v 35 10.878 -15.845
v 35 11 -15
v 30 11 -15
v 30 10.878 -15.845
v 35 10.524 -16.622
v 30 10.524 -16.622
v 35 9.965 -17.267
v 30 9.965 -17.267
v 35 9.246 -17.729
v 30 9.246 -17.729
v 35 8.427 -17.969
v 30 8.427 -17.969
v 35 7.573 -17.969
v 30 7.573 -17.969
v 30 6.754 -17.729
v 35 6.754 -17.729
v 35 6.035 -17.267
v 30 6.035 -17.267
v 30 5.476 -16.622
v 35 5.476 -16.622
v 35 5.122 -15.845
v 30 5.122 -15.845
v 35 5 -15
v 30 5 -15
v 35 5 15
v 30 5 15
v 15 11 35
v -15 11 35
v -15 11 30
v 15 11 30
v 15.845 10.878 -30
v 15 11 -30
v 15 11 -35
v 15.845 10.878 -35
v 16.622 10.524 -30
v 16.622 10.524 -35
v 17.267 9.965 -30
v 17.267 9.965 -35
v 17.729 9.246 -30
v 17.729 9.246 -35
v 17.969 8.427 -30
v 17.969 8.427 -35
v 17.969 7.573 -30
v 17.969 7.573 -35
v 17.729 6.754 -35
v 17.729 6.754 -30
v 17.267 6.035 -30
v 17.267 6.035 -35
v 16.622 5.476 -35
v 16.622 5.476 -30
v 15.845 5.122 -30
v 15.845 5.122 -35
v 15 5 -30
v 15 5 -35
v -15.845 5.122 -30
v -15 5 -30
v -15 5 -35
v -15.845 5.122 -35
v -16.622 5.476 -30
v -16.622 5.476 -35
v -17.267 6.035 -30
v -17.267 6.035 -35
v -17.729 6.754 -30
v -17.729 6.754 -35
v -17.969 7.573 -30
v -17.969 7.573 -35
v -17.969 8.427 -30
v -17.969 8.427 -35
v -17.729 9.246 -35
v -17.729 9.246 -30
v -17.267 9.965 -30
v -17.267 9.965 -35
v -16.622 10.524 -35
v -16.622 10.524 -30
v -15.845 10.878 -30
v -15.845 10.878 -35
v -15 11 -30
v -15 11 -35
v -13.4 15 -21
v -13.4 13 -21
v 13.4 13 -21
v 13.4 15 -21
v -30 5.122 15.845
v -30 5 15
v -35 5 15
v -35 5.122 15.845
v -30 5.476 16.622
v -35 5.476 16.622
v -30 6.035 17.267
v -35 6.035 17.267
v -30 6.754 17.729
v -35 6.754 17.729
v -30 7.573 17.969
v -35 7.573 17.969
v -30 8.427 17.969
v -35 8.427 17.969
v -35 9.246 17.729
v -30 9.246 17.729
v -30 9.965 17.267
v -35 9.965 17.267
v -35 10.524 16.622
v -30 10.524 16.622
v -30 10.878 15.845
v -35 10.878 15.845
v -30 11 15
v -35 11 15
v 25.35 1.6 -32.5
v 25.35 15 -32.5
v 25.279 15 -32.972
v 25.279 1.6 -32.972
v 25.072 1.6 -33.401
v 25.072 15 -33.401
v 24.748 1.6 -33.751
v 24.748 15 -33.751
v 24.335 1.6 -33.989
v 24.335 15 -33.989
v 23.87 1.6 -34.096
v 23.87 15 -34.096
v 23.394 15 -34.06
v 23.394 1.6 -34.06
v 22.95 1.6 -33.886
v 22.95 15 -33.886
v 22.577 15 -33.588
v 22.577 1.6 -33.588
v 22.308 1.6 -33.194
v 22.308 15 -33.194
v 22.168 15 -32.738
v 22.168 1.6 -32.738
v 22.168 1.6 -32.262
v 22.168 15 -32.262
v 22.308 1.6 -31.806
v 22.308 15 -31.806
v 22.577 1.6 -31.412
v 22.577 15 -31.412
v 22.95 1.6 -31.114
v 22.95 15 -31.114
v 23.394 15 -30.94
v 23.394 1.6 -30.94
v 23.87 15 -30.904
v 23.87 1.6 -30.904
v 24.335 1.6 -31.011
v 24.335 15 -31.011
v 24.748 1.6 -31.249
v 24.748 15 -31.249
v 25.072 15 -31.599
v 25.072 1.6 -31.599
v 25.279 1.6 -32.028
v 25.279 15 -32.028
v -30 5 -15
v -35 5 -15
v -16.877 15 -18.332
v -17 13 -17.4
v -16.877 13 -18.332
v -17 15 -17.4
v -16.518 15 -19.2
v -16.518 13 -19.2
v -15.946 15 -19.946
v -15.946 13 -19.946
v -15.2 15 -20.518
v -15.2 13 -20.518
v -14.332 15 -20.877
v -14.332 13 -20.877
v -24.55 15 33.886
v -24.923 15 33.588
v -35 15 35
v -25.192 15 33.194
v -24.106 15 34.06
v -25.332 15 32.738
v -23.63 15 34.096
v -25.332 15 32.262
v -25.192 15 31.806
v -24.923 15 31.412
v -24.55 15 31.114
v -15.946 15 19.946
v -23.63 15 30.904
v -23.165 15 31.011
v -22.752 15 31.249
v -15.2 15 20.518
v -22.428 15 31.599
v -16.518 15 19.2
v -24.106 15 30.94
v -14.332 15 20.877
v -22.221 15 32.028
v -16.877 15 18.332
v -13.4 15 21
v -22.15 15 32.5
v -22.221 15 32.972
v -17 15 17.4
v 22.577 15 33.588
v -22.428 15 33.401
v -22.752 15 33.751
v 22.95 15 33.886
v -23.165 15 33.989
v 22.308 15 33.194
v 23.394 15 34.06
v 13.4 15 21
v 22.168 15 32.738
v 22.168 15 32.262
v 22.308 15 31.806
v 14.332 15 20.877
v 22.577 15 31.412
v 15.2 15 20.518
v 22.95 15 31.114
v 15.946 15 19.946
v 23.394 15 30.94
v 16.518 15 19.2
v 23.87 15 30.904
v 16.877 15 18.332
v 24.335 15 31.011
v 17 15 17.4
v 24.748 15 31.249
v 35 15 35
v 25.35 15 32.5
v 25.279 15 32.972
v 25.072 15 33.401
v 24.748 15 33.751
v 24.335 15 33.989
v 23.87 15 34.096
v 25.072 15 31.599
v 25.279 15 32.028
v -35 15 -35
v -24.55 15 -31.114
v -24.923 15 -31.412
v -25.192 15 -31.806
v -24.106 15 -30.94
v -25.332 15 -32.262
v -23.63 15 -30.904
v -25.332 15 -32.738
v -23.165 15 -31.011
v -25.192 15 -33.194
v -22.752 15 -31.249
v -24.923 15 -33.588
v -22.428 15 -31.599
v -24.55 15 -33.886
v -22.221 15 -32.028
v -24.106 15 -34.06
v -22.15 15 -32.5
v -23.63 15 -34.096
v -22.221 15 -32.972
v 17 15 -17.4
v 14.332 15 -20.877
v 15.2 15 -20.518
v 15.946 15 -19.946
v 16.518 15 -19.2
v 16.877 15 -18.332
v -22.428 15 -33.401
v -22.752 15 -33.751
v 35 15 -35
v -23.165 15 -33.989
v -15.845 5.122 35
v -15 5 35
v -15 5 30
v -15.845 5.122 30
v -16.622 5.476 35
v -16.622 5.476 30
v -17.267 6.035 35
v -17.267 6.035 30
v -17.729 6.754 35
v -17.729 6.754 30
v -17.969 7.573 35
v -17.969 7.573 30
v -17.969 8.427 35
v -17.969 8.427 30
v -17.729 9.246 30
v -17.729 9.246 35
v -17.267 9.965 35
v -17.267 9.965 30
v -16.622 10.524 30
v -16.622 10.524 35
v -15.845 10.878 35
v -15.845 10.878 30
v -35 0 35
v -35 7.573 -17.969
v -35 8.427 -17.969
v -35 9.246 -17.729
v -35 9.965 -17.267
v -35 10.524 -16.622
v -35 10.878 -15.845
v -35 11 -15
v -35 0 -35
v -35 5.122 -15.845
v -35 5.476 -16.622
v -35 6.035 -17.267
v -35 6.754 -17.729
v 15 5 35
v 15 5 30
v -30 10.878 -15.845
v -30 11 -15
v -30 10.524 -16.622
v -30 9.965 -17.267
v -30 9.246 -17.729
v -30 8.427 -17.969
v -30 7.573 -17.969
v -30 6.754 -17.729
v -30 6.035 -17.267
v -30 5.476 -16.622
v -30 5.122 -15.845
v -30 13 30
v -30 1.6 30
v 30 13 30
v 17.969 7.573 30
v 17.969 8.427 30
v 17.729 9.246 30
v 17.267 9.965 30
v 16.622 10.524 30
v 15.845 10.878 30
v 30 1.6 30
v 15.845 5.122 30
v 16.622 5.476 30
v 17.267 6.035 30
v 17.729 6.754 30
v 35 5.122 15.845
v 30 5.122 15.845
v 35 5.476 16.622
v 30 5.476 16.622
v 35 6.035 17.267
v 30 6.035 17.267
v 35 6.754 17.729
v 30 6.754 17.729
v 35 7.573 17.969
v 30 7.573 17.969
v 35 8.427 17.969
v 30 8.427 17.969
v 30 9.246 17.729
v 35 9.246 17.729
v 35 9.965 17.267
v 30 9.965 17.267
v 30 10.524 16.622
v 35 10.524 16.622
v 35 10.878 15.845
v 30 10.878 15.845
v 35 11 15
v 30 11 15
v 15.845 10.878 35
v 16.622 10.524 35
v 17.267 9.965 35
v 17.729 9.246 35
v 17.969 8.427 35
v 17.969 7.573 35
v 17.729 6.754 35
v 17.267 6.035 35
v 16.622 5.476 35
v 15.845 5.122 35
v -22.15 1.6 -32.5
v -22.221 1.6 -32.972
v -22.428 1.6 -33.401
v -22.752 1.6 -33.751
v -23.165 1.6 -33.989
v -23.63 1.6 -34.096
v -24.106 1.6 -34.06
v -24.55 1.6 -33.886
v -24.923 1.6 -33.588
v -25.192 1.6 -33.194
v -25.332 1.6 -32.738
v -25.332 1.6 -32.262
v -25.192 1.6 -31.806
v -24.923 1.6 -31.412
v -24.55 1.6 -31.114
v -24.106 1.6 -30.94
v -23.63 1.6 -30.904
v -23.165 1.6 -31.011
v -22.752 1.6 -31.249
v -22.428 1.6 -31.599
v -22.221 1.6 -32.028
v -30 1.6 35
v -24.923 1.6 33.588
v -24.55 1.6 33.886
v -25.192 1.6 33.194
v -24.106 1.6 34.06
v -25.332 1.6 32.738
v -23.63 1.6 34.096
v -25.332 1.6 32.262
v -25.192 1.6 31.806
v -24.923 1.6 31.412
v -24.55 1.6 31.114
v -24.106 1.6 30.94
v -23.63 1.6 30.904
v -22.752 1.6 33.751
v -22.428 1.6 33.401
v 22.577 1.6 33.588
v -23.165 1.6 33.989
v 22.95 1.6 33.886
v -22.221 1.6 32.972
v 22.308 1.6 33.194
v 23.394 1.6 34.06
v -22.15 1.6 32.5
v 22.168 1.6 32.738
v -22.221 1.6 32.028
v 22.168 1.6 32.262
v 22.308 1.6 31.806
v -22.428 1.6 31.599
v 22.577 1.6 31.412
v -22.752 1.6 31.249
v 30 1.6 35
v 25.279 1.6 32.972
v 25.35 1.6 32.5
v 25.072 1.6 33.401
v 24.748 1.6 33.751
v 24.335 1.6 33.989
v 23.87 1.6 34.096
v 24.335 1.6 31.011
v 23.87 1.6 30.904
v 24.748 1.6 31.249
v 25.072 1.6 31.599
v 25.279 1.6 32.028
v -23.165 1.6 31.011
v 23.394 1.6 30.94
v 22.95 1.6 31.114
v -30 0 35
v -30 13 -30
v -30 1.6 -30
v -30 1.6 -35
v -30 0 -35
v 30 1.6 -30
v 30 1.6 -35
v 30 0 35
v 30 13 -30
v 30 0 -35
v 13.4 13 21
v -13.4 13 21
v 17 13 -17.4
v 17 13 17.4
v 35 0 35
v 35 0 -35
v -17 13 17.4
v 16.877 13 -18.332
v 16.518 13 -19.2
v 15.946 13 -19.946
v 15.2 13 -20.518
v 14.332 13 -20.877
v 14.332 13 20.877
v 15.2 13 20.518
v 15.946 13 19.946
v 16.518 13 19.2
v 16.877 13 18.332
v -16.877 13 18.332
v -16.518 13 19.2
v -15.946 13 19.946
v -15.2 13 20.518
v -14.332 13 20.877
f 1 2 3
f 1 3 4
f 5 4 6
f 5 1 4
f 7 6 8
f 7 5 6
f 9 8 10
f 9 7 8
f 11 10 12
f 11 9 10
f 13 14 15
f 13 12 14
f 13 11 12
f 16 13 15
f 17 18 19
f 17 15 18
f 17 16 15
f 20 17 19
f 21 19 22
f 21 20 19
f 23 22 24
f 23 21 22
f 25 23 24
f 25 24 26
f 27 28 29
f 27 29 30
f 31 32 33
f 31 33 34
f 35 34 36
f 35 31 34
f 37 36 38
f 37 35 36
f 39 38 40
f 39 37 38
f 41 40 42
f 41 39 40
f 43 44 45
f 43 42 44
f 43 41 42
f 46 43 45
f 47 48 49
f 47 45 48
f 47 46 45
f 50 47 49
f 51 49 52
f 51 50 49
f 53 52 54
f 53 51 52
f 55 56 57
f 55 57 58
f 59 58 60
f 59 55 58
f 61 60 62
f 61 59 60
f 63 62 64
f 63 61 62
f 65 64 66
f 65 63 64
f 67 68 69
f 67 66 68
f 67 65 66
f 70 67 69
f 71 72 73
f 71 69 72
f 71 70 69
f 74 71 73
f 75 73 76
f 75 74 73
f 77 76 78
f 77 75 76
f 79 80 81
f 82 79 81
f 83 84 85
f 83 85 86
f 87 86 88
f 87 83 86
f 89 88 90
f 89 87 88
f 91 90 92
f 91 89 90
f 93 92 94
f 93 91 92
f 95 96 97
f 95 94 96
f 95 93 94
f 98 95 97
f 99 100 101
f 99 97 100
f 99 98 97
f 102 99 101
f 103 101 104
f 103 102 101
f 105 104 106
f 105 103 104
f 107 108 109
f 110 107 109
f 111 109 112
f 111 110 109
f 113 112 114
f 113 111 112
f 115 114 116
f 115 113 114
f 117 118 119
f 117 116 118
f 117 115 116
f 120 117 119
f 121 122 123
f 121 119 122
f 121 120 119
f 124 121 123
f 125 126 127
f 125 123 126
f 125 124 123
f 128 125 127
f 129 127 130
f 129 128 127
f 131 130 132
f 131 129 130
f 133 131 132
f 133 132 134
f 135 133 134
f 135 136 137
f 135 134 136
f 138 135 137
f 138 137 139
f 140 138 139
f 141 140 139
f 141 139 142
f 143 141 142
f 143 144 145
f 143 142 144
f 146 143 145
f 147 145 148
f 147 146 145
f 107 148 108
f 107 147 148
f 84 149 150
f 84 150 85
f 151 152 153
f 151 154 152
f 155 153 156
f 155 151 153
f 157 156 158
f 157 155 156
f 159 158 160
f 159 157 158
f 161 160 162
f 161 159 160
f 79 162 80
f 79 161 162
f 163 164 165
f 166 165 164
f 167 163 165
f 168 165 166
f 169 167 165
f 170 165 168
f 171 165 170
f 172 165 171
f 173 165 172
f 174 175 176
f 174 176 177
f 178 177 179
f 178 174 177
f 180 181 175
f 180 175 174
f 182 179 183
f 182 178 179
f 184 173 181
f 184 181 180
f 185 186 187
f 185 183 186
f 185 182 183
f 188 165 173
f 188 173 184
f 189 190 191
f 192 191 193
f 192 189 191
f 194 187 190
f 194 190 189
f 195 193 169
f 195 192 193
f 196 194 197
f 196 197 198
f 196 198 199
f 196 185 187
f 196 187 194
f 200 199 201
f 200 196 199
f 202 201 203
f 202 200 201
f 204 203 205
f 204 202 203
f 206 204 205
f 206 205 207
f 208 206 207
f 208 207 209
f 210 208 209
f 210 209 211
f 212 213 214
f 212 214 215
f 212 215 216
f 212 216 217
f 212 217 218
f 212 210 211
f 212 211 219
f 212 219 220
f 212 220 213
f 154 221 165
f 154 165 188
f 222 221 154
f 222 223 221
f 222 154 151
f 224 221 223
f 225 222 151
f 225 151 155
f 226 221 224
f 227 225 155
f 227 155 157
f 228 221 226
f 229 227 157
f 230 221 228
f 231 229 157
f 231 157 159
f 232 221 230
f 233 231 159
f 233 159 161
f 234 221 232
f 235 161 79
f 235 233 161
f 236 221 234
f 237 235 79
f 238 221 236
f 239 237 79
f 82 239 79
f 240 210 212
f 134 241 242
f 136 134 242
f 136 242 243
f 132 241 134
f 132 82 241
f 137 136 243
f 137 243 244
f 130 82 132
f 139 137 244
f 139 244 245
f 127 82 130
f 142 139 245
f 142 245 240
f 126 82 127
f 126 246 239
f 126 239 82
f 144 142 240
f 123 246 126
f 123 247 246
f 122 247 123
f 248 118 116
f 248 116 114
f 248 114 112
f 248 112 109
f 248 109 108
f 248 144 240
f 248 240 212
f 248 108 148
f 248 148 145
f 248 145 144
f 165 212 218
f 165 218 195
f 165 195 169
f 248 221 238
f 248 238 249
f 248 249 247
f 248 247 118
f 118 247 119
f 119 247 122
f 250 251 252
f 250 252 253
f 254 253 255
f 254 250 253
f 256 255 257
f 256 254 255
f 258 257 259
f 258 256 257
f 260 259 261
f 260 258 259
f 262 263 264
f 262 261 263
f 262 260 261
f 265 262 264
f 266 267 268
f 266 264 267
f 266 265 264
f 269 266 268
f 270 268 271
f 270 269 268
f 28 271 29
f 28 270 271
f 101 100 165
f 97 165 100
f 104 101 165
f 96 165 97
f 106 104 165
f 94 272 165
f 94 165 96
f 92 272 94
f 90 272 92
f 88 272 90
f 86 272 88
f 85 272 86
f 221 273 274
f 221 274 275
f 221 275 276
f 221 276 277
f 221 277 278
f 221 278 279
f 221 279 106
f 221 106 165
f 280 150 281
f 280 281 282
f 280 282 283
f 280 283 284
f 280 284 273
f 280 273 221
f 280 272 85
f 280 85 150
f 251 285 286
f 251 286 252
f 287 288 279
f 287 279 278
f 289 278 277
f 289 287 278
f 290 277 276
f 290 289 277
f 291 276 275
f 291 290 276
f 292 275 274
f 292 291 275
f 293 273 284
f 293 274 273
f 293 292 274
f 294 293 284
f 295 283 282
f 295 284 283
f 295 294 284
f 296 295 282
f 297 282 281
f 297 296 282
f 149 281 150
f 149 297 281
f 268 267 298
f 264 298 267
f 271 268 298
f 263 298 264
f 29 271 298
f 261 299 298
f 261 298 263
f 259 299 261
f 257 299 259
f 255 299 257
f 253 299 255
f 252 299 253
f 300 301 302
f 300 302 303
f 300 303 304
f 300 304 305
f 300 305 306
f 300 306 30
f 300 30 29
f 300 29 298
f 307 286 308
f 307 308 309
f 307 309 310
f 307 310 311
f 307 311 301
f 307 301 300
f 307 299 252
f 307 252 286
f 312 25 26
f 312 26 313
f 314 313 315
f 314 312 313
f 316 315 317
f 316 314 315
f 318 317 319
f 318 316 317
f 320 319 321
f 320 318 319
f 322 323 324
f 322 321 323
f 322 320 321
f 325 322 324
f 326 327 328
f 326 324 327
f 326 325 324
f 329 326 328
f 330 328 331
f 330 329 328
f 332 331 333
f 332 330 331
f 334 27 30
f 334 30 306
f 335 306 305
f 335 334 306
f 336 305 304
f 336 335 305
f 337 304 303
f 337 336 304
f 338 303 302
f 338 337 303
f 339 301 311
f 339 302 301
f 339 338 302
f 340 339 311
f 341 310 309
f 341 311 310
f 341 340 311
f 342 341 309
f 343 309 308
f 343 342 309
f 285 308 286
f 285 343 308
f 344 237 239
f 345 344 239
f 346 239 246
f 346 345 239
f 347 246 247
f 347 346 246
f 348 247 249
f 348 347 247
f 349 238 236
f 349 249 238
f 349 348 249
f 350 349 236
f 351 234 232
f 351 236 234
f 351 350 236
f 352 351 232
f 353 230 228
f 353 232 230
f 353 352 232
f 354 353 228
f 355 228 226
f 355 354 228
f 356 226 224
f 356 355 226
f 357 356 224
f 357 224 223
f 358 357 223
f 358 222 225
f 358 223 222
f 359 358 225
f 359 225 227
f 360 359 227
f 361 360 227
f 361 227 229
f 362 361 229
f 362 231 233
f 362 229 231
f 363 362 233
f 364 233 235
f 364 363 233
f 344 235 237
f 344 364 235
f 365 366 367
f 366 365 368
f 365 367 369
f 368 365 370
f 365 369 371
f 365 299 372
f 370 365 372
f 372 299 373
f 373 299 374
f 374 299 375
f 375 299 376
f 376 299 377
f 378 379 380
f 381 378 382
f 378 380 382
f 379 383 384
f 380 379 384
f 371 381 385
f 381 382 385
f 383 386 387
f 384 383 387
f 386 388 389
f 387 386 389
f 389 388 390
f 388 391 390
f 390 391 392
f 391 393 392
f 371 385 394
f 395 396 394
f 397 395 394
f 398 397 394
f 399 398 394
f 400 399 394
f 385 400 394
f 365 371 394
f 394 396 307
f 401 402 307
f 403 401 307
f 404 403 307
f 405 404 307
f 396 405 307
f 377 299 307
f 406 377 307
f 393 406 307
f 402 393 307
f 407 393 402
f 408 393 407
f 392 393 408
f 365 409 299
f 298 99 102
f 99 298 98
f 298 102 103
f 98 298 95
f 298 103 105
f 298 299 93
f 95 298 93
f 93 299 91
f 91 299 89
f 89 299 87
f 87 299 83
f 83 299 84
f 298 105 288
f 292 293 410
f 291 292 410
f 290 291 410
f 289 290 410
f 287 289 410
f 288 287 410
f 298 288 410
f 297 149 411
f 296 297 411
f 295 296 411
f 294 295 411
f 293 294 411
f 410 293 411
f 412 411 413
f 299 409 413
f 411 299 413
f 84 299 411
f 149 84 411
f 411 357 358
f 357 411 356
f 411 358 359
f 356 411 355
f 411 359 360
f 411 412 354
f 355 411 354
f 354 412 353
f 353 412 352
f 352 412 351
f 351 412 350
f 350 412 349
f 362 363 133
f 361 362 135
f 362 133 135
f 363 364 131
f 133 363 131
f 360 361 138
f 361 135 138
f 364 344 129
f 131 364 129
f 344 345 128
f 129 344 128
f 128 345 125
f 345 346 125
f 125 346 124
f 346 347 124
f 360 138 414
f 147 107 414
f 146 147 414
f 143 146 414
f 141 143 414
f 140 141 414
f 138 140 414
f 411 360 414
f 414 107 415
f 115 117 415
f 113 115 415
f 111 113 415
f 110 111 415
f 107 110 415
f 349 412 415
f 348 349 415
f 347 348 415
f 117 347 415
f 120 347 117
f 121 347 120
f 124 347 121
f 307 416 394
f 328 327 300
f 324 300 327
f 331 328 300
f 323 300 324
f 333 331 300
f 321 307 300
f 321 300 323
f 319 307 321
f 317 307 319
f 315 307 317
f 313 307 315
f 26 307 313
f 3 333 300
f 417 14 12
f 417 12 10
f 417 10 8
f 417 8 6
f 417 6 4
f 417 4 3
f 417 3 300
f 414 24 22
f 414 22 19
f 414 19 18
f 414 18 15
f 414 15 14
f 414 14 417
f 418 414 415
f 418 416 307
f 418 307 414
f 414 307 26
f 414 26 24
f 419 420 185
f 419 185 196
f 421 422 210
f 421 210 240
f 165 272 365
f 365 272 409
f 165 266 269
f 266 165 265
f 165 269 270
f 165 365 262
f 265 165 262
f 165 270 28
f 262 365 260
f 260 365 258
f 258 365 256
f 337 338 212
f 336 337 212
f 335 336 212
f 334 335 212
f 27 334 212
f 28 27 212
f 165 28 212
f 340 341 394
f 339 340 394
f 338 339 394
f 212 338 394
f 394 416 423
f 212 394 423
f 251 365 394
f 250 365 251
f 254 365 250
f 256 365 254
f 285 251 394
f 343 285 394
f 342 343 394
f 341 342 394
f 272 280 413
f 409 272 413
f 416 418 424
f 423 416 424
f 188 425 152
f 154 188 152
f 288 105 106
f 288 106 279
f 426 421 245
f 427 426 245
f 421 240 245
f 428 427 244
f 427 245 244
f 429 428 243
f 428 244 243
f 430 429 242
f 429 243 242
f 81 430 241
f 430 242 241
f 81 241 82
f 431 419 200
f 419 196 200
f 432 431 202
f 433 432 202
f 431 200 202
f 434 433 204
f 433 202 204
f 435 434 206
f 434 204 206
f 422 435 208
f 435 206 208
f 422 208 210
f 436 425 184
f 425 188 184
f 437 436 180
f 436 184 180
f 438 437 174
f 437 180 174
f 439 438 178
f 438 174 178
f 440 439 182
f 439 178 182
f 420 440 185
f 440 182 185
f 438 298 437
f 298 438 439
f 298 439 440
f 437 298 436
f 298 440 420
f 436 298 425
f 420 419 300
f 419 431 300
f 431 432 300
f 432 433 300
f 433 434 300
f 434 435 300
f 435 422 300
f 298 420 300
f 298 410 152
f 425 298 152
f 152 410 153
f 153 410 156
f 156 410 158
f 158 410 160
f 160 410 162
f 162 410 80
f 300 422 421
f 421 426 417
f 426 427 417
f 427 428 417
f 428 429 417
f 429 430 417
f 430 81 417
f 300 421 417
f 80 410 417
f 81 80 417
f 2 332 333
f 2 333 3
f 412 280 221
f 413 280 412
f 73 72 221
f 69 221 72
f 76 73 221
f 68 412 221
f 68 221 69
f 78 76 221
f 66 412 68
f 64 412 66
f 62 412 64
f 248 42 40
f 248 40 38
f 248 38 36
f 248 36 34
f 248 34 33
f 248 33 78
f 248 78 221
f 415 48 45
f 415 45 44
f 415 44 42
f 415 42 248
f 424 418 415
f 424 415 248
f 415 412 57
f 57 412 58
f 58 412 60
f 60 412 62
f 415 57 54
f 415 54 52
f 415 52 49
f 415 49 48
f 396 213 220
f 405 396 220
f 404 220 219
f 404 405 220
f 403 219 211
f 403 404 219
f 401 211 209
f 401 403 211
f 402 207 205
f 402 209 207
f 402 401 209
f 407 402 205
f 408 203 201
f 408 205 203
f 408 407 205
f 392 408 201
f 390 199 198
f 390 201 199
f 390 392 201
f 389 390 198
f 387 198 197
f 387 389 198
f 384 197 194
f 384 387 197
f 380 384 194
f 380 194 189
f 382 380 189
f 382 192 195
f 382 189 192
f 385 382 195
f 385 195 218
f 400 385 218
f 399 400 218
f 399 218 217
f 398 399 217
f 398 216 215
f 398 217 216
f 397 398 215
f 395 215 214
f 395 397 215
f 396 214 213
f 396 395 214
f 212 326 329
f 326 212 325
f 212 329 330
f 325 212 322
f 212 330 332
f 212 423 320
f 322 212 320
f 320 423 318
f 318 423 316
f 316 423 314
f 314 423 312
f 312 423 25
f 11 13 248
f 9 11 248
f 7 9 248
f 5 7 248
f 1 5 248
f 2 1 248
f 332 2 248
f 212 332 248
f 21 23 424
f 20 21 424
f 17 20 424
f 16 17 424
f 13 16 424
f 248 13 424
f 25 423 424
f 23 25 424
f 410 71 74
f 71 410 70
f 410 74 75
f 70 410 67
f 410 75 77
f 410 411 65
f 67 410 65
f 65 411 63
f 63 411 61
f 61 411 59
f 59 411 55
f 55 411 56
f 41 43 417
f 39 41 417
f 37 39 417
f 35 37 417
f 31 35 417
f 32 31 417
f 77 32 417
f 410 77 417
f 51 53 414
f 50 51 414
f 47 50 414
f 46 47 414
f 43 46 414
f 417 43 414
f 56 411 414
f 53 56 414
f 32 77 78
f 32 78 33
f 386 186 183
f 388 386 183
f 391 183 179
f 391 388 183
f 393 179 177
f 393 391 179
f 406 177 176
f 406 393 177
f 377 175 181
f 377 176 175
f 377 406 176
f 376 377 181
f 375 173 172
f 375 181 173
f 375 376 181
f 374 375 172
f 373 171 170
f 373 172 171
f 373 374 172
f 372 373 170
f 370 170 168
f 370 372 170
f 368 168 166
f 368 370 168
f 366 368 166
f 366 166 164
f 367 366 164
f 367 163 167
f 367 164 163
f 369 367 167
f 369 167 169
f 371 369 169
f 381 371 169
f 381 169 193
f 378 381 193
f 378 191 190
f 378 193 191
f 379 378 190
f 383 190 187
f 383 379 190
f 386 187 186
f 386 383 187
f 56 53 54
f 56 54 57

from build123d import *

# Parameters (mm, degrees)
SKETCH1_W           = 70
SKETCH1_H           = 70
SKETCH1_W_2         = 60
SKETCH1_H_2         = 60
BOSS_EXTRUDE1_DEPTH = 15
BOSS_EXTRUDE2_START = 15
SKETCH1_2_W         = 70
SKETCH1_2_H         = 70
BOSS_EXTRUDE2_DEPTH = 2
CUT_EXTRUDE1_DEPTH  = 53.5
CUT_EXTRUDE2_DEPTH  = 38.5
CUT_EXTRUDE3_START  = 13
SKETCH4_W           = 34
SKETCH4_H           = 42
CUT_EXTRUDE3_DEPTH  = 5
FILLET1_R           = 3.6
SKETCH5_R           = 1.6
CUT_EXTRUDE4_DEPTH  = 25
SKETCH7_W           = 60
SKETCH7_H           = 5
CUT_EXTRUDE5_DEPTH  = 1.6


with BuildPart() as part:
    # Sketch1 → Boss-Extrude1 (new body)
    with BuildSketch(Plane(origin=(0, 0, 0), x_dir=(1, 0, 0), z_dir=(0, 1, 0))):
        Rectangle(SKETCH1_W, SKETCH1_H)
        Rectangle(SKETCH1_W_2, SKETCH1_H_2, mode=Mode.SUBTRACT)
    extrude(amount=BOSS_EXTRUDE1_DEPTH)

    # Sketch1<2> → Boss-Extrude2 (add)
    with BuildSketch(Plane(origin=(0, 0, 0), x_dir=(1, 0, 0), z_dir=(0, 1, 0)).offset(BOSS_EXTRUDE2_START)):
        Rectangle(SKETCH1_2_W, SKETCH1_2_H)
    extrude(amount=-BOSS_EXTRUDE2_DEPTH)

    # Sketch2 → Cut-Extrude1 (cut, symmetric)
    with BuildSketch(Plane.XY):
        with BuildLine():
            Line((-15, 11), (15, 11))
            ThreePointArc((15, 11), (18, 8), (15, 5))
            Line((15, 5), (-15, 5))
            ThreePointArc((-15, 5), (-18, 8), (-15, 11))
        make_face()
    extrude(amount=CUT_EXTRUDE1_DEPTH, both=True, mode=Mode.SUBTRACT)

    # Sketch3 → Cut-Extrude2 (cut, symmetric)
    with BuildSketch(Plane(origin=(0, 0, 0), x_dir=(0, 0, -1), z_dir=(1, 0, 0))):
        with BuildLine():
            Line((15, 5), (-15, 5))
            ThreePointArc((-15, 5), (-18, 8), (-15, 11))
            Line((-15, 11), (15, 11))
            ThreePointArc((15, 11), (18, 8), (15, 5))
        make_face()
    extrude(amount=CUT_EXTRUDE2_DEPTH, both=True, mode=Mode.SUBTRACT)

    # Sketch4 → Cut-Extrude3 (cut)
    with BuildSketch(Plane(origin=(0, 0, 0), x_dir=(1, 0, 0), z_dir=(0, 1, 0)).offset(CUT_EXTRUDE3_START)):
        Rectangle(SKETCH4_W, SKETCH4_H)
    extrude(amount=CUT_EXTRUDE3_DEPTH, mode=Mode.SUBTRACT)

    # Fillet1
    fillet1_edges = [part.edges().sort_by_distance(p)[0] for p in [
        (17, 14, 21),
        (17, 14, -21),
        (-17, 14, -21),
        (-17, 14, 21),
    ]]
    fillet(fillet1_edges, radius=FILLET1_R)

    # Sketch5 → Cut-Extrude4 (cut)
    with BuildSketch(Plane(origin=(0, 0, 0), x_dir=(1, 0, 0), z_dir=(0, 1, 0))):
        with Locations((-23.75, 32.5)):
            Circle(SKETCH5_R)
        with Locations((-23.75, -32.5)):
            Circle(SKETCH5_R)
        with Locations((23.75, 32.5)):
            Circle(SKETCH5_R)
        with Locations((23.75, -32.5)):
            Circle(SKETCH5_R)
    extrude(amount=CUT_EXTRUDE4_DEPTH, mode=Mode.SUBTRACT)

    # Sketch7 → Cut-Extrude5 (cut)
    with BuildSketch(Plane(origin=(0, 0, 0), x_dir=(1, 0, 0), z_dir=(0, 1, 0))):
        with Locations((0, 32.5)):
            Rectangle(SKETCH7_W, SKETCH7_H)
        with Locations((0, -32.5)):
            Rectangle(SKETCH7_W, SKETCH7_H)
    extrude(amount=CUT_EXTRUDE5_DEPTH, mode=Mode.SUBTRACT)


solid = part.part
